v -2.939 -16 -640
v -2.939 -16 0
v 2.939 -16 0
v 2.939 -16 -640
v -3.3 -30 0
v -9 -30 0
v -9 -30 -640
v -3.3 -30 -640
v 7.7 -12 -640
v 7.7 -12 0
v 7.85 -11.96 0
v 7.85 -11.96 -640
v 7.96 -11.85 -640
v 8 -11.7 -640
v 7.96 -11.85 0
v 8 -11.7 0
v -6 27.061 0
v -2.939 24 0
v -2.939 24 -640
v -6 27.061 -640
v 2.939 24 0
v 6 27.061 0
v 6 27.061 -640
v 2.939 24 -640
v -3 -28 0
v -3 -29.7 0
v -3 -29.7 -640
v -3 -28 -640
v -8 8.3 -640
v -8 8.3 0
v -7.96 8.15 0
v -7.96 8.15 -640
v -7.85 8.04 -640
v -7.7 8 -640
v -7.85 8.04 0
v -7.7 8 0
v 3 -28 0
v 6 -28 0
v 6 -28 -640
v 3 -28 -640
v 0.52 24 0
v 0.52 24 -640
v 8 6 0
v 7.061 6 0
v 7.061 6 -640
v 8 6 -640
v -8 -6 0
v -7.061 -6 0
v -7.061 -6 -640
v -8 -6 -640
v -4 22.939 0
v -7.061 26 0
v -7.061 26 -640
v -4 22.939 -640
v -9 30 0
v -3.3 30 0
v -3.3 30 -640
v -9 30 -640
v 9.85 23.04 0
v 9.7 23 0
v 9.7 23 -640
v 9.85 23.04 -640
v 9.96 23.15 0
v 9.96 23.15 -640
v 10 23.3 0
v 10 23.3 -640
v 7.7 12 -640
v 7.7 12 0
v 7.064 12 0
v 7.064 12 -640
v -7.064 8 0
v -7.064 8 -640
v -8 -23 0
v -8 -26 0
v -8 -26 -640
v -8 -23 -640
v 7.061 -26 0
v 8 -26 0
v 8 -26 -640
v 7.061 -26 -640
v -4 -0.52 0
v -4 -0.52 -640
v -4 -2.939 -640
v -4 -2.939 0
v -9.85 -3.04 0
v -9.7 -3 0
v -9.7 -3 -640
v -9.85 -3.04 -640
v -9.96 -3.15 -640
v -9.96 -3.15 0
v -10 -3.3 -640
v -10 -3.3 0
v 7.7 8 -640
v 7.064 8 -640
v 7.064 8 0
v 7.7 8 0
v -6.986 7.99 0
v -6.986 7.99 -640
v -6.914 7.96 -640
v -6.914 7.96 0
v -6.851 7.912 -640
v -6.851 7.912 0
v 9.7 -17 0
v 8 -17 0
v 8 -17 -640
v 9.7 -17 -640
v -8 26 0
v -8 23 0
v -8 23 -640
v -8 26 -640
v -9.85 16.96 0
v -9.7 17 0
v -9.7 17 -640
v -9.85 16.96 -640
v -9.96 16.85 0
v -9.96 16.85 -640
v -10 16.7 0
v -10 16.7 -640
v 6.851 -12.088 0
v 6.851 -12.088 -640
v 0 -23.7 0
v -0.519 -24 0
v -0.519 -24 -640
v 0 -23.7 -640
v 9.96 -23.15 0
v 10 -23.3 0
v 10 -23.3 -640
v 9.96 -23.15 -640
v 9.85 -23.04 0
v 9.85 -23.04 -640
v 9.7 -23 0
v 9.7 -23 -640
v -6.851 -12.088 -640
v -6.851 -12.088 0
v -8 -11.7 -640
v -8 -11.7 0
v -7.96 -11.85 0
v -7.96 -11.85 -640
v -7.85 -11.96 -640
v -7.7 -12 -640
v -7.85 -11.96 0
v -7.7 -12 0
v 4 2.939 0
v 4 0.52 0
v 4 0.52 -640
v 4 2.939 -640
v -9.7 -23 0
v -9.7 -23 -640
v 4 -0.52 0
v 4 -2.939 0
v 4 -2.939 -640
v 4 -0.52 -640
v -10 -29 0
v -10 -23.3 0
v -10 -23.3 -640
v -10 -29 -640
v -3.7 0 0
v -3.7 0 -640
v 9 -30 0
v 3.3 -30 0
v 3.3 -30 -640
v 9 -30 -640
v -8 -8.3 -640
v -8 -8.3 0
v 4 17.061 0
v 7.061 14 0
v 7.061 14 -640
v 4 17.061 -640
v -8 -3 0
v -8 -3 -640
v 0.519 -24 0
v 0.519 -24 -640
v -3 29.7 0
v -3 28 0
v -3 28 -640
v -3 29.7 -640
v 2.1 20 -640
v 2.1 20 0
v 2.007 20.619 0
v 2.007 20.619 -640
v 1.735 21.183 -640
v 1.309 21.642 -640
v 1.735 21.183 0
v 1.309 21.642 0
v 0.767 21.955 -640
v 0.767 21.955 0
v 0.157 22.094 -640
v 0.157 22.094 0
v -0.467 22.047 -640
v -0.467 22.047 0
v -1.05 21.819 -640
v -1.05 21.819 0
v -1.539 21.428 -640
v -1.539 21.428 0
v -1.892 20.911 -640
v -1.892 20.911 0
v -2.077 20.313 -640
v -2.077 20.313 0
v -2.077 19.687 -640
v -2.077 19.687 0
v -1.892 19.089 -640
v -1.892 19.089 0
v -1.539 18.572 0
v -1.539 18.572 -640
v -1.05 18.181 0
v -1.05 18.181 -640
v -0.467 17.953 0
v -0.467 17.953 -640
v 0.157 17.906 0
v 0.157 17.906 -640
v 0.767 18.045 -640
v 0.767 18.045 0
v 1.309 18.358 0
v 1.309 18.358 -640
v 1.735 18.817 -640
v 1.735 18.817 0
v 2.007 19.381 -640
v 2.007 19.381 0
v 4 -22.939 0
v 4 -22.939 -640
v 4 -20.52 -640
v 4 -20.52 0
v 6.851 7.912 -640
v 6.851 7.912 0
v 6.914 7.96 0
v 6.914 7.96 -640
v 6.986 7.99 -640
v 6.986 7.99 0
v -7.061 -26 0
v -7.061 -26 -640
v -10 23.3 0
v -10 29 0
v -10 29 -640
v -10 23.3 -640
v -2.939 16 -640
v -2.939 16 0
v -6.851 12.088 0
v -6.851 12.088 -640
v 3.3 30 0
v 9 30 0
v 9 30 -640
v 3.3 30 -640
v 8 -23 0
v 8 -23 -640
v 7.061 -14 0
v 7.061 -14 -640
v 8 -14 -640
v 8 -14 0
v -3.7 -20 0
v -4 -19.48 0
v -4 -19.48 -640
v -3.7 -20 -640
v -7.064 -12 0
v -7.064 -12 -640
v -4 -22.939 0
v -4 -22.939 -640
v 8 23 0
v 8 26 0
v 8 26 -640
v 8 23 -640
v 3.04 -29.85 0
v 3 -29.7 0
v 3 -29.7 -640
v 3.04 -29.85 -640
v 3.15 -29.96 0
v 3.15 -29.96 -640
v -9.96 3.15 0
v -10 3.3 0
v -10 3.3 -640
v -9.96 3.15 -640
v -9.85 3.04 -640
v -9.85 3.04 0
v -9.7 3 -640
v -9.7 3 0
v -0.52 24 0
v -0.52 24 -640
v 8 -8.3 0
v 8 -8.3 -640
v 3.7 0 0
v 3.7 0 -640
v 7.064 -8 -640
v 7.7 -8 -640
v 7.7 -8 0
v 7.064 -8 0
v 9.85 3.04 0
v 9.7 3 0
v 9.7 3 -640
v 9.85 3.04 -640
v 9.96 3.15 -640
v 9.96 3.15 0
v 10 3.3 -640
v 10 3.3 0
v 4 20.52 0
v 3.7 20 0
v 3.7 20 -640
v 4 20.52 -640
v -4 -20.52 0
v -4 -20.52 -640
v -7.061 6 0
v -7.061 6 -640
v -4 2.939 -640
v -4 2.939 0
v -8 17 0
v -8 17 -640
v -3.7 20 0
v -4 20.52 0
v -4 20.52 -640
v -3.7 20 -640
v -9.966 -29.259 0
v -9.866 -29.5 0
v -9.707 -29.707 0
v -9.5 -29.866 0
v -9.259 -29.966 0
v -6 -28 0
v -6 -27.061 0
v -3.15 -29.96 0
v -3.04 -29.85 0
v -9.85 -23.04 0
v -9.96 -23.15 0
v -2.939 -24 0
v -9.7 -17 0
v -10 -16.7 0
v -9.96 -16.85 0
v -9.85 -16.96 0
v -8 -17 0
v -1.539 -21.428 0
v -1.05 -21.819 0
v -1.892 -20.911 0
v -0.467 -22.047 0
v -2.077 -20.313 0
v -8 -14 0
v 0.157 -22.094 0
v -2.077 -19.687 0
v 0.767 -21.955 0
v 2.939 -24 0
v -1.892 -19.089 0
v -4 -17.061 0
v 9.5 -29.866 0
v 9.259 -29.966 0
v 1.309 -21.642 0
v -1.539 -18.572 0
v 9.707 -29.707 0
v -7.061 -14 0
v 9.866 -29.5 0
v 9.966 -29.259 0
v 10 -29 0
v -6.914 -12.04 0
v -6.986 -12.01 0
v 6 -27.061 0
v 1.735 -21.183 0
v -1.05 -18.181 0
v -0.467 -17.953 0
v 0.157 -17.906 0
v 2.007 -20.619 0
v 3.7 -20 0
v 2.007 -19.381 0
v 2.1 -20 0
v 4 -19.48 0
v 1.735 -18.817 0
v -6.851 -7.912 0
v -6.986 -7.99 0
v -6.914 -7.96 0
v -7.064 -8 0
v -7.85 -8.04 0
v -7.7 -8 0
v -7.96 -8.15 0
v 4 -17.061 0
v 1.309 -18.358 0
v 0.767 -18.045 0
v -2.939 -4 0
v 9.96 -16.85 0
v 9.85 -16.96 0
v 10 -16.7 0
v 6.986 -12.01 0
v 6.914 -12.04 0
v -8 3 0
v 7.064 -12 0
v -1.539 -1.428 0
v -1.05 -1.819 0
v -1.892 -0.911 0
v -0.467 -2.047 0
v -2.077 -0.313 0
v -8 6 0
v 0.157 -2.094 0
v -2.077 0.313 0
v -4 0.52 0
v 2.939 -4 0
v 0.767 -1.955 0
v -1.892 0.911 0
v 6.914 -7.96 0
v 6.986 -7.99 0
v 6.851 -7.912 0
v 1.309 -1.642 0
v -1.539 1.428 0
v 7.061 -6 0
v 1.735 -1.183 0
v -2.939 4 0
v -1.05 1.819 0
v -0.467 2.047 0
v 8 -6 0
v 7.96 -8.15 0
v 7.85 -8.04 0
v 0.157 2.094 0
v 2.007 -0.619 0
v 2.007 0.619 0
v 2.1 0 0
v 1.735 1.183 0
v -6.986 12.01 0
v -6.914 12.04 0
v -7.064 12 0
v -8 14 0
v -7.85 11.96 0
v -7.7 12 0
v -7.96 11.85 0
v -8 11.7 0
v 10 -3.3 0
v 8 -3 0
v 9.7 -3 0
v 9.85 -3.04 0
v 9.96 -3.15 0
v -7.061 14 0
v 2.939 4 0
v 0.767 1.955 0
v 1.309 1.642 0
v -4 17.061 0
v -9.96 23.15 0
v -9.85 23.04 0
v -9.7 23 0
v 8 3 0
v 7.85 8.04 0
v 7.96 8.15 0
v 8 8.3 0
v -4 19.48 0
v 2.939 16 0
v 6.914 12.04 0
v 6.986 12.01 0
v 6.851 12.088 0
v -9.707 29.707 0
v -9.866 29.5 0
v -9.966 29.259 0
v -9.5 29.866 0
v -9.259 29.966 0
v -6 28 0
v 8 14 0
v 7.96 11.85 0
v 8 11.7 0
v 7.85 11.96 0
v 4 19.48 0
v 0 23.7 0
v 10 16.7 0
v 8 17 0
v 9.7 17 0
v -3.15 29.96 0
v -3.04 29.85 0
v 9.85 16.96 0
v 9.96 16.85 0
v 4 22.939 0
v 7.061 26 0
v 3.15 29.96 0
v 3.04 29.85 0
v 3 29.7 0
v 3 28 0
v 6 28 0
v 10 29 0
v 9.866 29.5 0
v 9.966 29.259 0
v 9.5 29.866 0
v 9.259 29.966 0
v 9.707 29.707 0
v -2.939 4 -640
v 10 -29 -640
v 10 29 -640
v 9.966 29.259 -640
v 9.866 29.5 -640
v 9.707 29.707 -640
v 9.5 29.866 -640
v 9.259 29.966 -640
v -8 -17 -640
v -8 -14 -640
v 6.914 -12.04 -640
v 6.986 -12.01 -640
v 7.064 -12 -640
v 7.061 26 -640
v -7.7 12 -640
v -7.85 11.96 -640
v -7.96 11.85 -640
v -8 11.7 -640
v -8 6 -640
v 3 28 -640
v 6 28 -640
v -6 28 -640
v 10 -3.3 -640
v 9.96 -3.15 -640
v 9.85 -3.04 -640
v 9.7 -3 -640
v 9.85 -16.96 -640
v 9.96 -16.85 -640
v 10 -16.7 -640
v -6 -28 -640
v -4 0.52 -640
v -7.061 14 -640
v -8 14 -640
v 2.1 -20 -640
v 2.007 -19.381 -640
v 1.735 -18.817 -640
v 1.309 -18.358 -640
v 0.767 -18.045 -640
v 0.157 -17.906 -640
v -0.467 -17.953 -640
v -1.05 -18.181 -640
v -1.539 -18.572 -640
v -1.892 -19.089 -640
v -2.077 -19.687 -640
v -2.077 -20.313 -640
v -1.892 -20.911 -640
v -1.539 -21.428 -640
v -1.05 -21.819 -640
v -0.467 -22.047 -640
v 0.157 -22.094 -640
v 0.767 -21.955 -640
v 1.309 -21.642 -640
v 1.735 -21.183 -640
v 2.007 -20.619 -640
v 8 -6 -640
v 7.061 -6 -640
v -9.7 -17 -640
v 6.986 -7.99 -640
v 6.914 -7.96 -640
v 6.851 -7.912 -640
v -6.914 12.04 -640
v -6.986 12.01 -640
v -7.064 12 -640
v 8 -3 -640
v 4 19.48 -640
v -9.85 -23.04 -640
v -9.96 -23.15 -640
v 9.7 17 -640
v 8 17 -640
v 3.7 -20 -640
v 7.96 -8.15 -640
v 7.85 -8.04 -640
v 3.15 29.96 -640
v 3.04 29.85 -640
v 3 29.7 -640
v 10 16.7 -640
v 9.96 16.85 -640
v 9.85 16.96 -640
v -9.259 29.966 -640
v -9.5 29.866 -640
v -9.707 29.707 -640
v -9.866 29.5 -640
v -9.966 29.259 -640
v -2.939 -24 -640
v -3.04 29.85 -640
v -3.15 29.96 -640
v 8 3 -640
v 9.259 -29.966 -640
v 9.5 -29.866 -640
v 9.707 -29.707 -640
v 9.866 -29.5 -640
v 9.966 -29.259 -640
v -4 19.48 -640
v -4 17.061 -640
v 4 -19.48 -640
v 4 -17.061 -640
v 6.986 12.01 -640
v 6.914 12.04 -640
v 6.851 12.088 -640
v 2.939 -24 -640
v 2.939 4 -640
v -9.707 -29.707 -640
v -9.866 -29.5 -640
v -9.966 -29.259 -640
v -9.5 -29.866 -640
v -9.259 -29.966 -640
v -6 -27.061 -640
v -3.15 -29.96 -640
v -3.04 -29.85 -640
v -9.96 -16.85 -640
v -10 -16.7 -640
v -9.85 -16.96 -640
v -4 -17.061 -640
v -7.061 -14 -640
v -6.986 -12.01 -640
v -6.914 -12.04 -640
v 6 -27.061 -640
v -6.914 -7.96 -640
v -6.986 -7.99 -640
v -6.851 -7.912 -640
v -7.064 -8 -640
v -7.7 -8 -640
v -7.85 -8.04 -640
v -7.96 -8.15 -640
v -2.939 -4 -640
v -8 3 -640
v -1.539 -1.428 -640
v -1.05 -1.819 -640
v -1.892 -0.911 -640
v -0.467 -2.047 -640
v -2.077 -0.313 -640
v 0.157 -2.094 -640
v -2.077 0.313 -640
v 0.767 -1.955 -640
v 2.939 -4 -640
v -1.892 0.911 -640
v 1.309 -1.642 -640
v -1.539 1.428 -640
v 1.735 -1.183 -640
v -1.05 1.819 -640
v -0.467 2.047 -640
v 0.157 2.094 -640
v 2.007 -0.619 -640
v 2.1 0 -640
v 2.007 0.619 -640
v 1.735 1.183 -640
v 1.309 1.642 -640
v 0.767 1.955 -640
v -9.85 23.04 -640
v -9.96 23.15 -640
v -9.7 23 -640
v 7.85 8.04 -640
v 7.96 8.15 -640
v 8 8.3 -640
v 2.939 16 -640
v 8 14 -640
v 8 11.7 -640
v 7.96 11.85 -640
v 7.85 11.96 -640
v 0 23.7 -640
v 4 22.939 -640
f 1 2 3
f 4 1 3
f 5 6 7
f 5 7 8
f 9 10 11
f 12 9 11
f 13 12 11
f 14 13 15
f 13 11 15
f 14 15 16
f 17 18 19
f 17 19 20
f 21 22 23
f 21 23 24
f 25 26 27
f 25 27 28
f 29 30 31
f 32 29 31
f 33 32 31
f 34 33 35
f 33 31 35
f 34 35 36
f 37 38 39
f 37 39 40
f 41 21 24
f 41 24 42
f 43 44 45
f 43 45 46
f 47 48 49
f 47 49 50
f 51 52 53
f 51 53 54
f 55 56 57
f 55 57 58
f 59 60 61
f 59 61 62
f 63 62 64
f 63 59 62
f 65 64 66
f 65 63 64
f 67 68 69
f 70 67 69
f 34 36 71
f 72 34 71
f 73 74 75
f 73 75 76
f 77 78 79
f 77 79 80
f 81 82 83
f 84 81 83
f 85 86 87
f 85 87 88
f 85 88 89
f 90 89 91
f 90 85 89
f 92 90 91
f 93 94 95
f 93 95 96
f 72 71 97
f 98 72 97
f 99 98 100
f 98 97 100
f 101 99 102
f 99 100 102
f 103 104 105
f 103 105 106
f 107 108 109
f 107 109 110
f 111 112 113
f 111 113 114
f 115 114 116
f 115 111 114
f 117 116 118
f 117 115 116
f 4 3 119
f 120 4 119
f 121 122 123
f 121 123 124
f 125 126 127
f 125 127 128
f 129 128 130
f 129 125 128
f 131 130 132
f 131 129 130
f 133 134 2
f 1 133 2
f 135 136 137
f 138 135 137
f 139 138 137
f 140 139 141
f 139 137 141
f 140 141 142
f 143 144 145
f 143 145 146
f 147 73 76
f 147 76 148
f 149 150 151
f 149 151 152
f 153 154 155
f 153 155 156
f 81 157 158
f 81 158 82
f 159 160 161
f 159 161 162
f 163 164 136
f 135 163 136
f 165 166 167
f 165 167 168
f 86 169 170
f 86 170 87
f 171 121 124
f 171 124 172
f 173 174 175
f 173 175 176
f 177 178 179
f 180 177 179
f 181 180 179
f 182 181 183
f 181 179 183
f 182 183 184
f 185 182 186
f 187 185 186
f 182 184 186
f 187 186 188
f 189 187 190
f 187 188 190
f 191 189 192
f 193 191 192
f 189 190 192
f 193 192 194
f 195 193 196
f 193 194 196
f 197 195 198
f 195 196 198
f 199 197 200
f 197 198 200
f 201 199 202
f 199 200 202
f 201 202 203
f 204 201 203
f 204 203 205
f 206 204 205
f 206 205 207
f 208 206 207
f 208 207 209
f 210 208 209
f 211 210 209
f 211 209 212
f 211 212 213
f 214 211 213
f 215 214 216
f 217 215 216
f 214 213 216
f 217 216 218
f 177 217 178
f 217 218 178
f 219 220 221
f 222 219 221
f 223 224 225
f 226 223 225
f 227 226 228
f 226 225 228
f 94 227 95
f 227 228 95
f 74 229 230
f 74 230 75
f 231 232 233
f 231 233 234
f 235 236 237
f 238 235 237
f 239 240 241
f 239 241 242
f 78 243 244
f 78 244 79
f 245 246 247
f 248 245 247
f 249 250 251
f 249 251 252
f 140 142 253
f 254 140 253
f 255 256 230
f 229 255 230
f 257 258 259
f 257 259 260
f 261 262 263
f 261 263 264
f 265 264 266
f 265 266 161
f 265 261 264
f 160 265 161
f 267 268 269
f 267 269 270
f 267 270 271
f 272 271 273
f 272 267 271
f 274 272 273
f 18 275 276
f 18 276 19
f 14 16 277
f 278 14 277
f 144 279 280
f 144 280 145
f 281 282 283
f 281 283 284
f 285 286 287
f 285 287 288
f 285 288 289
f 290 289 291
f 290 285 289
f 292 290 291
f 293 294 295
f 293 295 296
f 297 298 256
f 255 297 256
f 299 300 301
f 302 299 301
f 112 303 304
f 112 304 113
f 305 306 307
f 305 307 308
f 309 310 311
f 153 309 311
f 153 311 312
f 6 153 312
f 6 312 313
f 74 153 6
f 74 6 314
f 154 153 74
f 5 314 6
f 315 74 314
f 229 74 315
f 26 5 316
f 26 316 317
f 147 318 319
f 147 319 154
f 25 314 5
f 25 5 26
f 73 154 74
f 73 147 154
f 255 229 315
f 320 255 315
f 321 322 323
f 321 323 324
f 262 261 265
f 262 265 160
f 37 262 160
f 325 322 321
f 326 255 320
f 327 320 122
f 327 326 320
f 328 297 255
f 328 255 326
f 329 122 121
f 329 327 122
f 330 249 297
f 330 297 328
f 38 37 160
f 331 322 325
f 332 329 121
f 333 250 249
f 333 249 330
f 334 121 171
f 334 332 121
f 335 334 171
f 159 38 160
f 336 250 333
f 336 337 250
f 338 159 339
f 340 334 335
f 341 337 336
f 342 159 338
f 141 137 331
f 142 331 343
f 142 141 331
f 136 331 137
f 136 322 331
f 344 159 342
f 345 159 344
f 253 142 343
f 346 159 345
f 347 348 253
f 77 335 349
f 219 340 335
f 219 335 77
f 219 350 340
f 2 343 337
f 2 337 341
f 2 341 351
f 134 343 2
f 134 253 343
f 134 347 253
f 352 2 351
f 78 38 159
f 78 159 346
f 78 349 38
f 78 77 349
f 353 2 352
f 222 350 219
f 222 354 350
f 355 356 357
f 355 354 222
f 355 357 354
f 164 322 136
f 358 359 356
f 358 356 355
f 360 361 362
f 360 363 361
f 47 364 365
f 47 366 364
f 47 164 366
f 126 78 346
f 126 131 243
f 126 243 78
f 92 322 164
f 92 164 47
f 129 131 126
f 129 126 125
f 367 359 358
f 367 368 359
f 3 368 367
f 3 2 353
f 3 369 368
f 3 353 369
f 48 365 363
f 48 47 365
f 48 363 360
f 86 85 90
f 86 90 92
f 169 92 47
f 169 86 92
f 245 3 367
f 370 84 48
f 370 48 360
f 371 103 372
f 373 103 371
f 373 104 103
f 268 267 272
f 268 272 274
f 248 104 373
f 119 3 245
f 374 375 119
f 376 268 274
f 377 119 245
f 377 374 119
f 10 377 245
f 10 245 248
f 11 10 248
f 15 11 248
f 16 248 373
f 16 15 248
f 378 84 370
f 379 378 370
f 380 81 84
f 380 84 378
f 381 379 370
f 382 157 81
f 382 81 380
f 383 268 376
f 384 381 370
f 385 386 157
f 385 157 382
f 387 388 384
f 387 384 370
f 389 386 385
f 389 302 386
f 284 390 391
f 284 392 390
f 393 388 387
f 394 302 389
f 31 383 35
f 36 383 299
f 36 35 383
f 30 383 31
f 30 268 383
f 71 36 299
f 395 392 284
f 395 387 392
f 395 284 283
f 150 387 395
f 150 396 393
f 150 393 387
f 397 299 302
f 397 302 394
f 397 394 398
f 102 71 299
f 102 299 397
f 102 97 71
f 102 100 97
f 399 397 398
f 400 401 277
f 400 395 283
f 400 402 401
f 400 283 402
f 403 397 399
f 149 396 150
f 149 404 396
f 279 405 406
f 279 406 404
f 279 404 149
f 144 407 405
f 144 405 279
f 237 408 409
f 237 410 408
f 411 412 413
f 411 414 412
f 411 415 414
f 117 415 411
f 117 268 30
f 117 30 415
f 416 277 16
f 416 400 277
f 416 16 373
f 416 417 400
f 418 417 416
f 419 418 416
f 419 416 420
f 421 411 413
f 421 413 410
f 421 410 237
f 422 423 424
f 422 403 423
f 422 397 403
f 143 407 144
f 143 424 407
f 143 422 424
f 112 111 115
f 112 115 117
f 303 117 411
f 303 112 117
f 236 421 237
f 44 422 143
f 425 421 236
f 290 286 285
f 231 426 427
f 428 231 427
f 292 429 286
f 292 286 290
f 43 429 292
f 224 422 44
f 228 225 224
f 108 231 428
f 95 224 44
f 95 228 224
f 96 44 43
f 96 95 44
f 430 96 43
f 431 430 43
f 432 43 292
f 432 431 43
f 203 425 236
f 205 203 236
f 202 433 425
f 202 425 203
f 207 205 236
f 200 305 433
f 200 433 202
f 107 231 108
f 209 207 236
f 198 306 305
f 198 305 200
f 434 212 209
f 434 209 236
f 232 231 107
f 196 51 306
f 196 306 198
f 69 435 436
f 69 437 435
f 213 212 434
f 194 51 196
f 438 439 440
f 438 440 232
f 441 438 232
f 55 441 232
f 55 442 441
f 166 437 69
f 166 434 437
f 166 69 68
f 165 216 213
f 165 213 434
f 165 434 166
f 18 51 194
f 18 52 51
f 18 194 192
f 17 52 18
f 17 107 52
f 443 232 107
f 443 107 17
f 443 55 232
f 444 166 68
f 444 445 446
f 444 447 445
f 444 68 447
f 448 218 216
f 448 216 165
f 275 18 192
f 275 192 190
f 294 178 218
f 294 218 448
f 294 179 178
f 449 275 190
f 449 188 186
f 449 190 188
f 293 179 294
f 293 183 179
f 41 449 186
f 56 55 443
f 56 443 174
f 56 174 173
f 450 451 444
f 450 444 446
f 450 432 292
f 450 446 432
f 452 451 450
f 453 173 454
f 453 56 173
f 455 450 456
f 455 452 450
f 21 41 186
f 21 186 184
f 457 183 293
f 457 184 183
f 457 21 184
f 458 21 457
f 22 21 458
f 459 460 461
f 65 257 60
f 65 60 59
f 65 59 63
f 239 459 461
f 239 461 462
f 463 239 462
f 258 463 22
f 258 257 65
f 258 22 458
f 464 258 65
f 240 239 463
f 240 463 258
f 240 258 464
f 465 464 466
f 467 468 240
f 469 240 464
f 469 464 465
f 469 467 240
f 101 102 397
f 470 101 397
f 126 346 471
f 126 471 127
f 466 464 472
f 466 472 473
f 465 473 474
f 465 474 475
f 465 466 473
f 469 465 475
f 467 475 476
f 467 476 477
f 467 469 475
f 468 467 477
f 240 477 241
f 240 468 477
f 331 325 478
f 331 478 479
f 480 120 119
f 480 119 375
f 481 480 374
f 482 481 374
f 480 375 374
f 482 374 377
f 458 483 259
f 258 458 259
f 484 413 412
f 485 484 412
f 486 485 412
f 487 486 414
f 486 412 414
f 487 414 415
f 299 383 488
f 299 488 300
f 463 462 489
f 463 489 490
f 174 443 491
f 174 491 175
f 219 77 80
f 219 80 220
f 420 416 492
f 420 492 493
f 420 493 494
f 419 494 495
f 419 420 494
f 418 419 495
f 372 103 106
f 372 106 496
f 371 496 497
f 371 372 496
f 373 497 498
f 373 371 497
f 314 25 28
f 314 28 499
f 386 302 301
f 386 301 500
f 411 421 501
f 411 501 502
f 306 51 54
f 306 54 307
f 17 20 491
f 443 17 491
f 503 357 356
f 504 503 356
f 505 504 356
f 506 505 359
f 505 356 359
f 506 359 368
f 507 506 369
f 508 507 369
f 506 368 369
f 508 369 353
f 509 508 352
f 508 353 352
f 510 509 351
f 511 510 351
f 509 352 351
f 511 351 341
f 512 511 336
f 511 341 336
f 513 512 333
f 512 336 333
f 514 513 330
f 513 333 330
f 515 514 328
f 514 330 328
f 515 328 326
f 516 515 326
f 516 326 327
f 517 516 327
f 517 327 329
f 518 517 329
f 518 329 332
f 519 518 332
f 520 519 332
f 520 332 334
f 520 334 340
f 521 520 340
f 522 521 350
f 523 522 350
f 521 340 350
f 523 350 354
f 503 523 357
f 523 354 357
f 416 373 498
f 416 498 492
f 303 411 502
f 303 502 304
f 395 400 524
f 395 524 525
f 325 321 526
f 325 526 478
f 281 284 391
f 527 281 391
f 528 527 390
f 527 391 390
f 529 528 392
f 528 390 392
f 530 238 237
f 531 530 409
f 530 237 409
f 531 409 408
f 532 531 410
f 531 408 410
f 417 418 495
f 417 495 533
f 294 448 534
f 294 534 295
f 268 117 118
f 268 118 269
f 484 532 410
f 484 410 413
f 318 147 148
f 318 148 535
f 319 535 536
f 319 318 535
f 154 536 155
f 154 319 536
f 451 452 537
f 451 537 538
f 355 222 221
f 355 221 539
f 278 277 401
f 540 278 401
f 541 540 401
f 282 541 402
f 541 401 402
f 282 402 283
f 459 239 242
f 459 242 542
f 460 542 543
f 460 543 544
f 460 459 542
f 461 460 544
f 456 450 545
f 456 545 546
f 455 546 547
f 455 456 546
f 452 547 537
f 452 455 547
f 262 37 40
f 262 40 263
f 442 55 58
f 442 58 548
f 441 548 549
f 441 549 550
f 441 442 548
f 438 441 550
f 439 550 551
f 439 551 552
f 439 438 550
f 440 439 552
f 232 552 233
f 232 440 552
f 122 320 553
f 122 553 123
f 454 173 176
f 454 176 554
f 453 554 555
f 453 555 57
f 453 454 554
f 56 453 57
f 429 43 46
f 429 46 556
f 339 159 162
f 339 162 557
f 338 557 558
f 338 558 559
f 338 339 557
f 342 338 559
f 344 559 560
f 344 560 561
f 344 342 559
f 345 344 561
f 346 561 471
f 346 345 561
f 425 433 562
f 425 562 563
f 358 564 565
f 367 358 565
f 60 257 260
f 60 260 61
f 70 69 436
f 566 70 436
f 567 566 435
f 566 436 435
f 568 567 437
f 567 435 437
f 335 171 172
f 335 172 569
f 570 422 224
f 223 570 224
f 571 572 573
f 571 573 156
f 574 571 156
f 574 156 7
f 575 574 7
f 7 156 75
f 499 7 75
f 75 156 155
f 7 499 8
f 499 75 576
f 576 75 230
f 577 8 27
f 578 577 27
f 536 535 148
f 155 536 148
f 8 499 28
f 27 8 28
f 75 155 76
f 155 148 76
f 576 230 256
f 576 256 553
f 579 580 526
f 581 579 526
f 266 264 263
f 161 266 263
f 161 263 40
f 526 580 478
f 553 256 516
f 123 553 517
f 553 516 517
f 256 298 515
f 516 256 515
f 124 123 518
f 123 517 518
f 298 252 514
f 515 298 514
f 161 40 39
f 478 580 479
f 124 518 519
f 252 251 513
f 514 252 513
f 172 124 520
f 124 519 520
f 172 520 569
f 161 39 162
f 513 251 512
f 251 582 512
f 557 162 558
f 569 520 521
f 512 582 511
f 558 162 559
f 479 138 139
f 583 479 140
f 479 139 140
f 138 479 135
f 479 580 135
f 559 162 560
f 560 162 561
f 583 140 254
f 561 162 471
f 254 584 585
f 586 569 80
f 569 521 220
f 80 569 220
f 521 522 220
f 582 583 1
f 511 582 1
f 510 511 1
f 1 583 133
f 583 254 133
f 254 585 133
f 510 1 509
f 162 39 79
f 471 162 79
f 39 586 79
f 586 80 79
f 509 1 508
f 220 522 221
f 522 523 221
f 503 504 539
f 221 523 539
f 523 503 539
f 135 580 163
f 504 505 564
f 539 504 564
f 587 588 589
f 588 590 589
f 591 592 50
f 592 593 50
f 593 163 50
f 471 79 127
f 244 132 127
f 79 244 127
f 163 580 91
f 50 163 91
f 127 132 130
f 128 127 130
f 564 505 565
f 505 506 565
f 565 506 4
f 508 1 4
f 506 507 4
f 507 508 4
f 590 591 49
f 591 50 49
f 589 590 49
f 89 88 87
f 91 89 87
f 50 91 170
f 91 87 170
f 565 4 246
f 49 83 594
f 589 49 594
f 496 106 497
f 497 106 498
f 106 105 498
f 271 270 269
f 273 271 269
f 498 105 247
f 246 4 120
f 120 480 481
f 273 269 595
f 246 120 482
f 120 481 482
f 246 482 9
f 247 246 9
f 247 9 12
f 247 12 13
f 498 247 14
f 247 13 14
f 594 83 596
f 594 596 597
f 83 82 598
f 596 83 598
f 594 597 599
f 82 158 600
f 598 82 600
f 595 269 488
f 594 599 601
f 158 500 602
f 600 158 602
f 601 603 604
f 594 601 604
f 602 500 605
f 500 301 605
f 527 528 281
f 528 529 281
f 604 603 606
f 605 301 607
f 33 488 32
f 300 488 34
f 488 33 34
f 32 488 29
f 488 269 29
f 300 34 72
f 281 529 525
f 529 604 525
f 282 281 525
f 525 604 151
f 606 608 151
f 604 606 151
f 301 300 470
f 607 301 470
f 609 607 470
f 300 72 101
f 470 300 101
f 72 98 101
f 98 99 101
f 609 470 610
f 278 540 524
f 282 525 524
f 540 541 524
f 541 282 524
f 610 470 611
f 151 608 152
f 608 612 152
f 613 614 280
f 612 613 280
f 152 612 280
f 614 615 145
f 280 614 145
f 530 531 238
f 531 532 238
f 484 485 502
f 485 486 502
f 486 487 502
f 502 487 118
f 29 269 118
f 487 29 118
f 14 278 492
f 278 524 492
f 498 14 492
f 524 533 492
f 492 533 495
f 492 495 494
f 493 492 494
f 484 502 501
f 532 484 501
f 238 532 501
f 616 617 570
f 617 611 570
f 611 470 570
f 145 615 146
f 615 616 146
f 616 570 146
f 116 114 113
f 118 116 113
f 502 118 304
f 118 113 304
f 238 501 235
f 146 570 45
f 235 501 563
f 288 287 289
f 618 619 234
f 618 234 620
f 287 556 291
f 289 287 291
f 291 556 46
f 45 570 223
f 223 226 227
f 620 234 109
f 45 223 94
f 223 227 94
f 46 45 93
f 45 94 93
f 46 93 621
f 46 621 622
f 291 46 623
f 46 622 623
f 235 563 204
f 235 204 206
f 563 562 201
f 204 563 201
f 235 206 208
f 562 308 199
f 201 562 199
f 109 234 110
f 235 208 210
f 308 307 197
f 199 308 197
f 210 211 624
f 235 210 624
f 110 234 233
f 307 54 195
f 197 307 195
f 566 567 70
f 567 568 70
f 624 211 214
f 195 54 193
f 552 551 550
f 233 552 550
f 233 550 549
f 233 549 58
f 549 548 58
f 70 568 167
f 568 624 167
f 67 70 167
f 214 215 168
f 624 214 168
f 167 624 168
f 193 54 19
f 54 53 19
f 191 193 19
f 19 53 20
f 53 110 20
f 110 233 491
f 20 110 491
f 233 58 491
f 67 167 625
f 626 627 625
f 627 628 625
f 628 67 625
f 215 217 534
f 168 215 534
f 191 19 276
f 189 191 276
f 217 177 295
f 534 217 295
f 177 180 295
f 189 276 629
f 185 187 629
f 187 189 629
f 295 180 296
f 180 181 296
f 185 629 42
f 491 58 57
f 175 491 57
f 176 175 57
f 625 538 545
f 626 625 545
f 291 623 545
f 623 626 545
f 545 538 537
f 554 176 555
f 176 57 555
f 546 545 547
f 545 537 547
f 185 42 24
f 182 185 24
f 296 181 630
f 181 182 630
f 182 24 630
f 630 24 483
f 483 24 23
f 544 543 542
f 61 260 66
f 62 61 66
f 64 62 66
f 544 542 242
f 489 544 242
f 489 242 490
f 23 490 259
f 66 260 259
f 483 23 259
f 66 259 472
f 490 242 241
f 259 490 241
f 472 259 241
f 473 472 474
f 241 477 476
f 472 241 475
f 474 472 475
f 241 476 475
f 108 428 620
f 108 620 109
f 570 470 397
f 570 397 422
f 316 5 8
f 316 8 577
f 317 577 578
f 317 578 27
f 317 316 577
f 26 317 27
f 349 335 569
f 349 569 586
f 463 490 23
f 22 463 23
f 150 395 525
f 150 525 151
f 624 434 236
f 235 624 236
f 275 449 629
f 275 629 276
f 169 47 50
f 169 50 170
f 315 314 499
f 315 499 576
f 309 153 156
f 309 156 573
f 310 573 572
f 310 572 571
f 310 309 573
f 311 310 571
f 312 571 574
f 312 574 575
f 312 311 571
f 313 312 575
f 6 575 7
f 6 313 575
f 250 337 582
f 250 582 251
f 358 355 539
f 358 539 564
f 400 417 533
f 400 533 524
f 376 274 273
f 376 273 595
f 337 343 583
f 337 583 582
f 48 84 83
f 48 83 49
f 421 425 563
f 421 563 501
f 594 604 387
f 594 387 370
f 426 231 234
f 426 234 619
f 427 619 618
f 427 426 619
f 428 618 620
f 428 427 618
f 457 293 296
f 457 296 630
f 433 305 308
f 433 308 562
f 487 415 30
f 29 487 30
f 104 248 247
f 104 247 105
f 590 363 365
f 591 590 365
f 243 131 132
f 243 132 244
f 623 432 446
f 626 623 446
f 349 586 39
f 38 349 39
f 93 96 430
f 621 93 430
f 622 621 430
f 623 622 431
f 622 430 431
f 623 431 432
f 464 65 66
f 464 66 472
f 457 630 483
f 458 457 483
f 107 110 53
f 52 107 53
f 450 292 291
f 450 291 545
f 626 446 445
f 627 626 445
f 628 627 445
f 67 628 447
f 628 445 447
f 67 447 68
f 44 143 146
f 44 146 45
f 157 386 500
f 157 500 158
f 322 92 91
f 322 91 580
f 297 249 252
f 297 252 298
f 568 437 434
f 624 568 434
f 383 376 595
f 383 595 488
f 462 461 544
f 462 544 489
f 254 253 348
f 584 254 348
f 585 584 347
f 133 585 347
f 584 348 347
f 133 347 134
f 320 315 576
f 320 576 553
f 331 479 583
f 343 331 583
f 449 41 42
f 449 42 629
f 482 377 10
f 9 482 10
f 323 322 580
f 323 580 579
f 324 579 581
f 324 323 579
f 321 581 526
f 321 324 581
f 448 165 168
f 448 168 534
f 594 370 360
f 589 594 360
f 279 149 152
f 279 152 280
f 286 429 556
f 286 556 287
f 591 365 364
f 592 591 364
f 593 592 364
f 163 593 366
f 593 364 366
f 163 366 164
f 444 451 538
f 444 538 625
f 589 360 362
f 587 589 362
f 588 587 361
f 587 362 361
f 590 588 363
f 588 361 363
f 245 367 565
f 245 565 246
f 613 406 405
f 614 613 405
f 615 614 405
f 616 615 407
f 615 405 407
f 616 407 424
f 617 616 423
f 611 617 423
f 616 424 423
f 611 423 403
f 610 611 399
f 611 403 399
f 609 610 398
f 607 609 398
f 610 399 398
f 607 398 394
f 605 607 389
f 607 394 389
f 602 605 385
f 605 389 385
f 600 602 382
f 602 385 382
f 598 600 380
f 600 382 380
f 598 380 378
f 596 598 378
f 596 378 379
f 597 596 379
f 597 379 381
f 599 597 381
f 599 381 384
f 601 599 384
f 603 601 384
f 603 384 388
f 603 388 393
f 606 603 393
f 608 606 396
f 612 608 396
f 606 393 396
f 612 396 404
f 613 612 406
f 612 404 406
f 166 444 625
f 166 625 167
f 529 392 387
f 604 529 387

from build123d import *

# Parameters (mm, degrees)
SKETCH_1_R      = 2.0999999
EXTRUDE_1_DEPTH = 640


with BuildPart() as part:
    # 草圖1 → 填料-伸長1 (new body)
    with BuildSketch(Plane.XY):
        with BuildLine():
            Line((-10, 16.7), (-10, 3.3))
            ThreePointArc((-10, 3.3), (-9.912132034, 3.087867966), (-9.7, 3))
            Line((-9.7, 3), (-8, 3))
            Line((-8, 3), (-8, 6))
            Line((-8, 6), (-7.060650687, 6))
            Line((-7.060650687, 6), (-4, 2.939349))
            Line((-4, 2.939349), (-4, 0.519615242))
            Line((-4, 0.519615242), (-3.7, 0))
            Line((-3.7, 0), (-4, -0.519615242))
            Line((-4, -0.519615242), (-4, -2.9393502))
            Line((-4, -2.9393502), (-7.060649487, -6))
            Line((-7.060649487, -6), (-8, -6))
            Line((-8, -6), (-8, -3))
            Line((-8, -3), (-9.7, -3))
            ThreePointArc((-9.7, -3), (-9.912132034, -3.087867966), (-10, -3.3))
            Line((-10, -3.3), (-10, -16.7))
            ThreePointArc((-10, -16.7), (-9.912132034, -16.912132034), (-9.7, -17))
            Line((-9.7, -17), (-8, -17))
            Line((-8, -17), (-8, -14))
            Line((-8, -14), (-7.060672887, -14))
            Line((-7.060672887, -14), (-4, -17.0606732))
            Line((-4, -17.0606732), (-4, -19.480384758))
            Line((-4, -19.480384758), (-3.7, -20))
            Line((-3.7, -20), (-4, -20.519615242))
            Line((-4, -20.519615242), (-4, -22.93935665))
            Line((-4, -22.93935665), (-7.060643037, -26))
            Line((-7.060643037, -26), (-8, -26))
            Line((-8, -26), (-8, -23))
            Line((-8, -23), (-9.7, -23))
            ThreePointArc((-9.7, -23), (-9.912132034, -23.087867966), (-10, -23.3))
            Line((-10, -23.3), (-10, -29))
            ThreePointArc((-10, -29), (-9.707106781, -29.707106781), (-9, -30))
            Line((-9, -30), (-3.3, -30))
            ThreePointArc((-3.3, -30), (-3.087867966, -29.912132034), (-3, -29.7))
            Line((-3, -29.7), (-3, -28))
            Line((-3, -28), (-6, -28))
            Line((-6, -28), (-6, -27.060683408))
            Line((-6, -27.060683408), (-2.939316, -24))
            Line((-2.939316, -24), (-0.519095055, -24))
            Line((-0.519095055, -24), (1e-06, -23.7))
            Line((1e-06, -23.7), (0.518577868, -24))
            Line((0.518577868, -24), (2.939318, -24))
            Line((2.939318, -24), (6, -27.060682403))
            Line((6, -27.060682403), (6, -28))
            Line((6, -28), (3, -28))
            Line((3, -28), (3, -29.7))
            ThreePointArc((3, -29.7), (3.087867966, -29.912132034), (3.3, -30))
            Line((3.3, -30), (9, -30))
            ThreePointArc((9, -30), (9.707106781, -29.707106781), (10, -29))
            Line((10, -29), (10, -23.3))
            ThreePointArc((10, -23.3), (9.912132034, -23.087867966), (9.7, -23))
            Line((9.7, -23), (8, -23))
            Line((8, -23), (8, -26))
            Line((8, -26), (7.060637687, -26))
            Line((7.060637687, -26), (4, -22.93935641))
            Line((4, -22.93935641), (4, -20.519623992))
            Line((4, -20.519623992), (3.7, -20.00000875))
            Line((3.7, -20.00000875), (4, -19.480393508))
            Line((4, -19.480393508), (4, -17.06066109))
            Line((4, -17.06066109), (7.060655187, -14))
            Line((7.060655187, -14), (8, -14))
            Line((8, -14), (8, -17))
            Line((8, -17), (9.7, -17))
            ThreePointArc((9.7, -17), (9.912132034, -16.912132034), (10, -16.7))
            Line((10, -16.7), (10, -3.3))
            ThreePointArc((10, -3.3), (9.912132034, -3.087867966), (9.7, -3))
            Line((9.7, -3), (8, -3))
            Line((8, -3), (8, -6))
            Line((8, -6), (7.060651537, -6))
            Line((7.060651537, -6), (4, -2.93934815))
            Line((4, -2.93934815), (4, -0.519623992))
            Line((4, -0.519623992), (3.7, -8.75e-06))
            Line((3.7, -8.75e-06), (4, 0.519606492))
            Line((4, 0.519606492), (4, 2.9393426))
            Line((4, 2.9393426), (7.060657087, 6))
            Line((7.060657087, 6), (8, 6))
            Line((8, 6), (8, 3))
            Line((8, 3), (9.7, 3))
            ThreePointArc((9.7, 3), (9.912132034, 3.087867966), (10, 3.3))
            Line((10, 3.3), (10, 16.7))
            ThreePointArc((10, 16.7), (9.912132034, 16.912132034), (9.7, 17))
            Line((9.7, 17), (8, 17))
            Line((8, 17), (8, 14))
            Line((8, 14), (7.06065821, 14))
            Line((7.06065821, 14), (4, 17.060658523))
            Line((4, 17.060658523), (4, 19.480376008))
            Line((4, 19.480376008), (3.7, 19.99999125))
            Line((3.7, 19.99999125), (4, 20.519606492))
            Line((4, 20.519606492), (4, 22.939362173))
            Line((4, 22.939362173), (7.060637514, 26))
            Line((7.060637514, 26), (8, 26))
            Line((8, 26), (8, 23))
            Line((8, 23), (9.7, 23))
            ThreePointArc((9.7, 23), (9.912132034, 23.087867966), (10, 23.3))
            Line((10, 23.3), (10, 29))
            ThreePointArc((10, 29), (9.707106781, 29.707106781), (9, 30))
            Line((9, 30), (3.3, 30))
            ThreePointArc((3.3, 30), (3.087867966, 29.912132034), (3, 29.7))
            Line((3, 29.7), (3, 28))
            Line((3, 28), (6, 28))
            Line((6, 28), (6, 27.060684313))
            Line((6, 27.060684313), (2.939316, 24))
            Line((2.939316, 24), (0.519614242, 24))
            Line((0.519614242, 24), (-1e-06, 23.7))
            Line((-1e-06, 23.7), (-0.519616242, 24))
            Line((-0.519616242, 24), (-2.939318, 24))
            Line((-2.939318, 24), (-6, 27.060682313))
            Line((-6, 27.060682313), (-6, 28))
            Line((-6, 28), (-3, 28))
            Line((-3, 28), (-3, 29.7))
            ThreePointArc((-3, 29.7), (-3.087867966, 29.912132034), (-3.3, 30))
            Line((-3.3, 30), (-9, 30))
            ThreePointArc((-9, 30), (-9.707106781, 29.707106781), (-10, 29))
            Line((-10, 29), (-10, 23.3))
            ThreePointArc((-10, 23.3), (-9.912132034, 23.087867966), (-9.7, 23))
            Line((-9.7, 23), (-8, 23))
            Line((-8, 23), (-8, 26))
            Line((-8, 26), (-7.060644014, 26))
            Line((-7.060644014, 26), (-4, 22.939355673))
            Line((-4, 22.939355673), (-4, 20.519615242))
            Line((-4, 20.519615242), (-3.7, 20))
            Line((-3.7, 20), (-4, 19.480384758))
            Line((-4, 19.480384758), (-4, 17.060669373))
            Line((-4, 17.060669373), (-7.06066906, 14))
            Line((-7.06066906, 14), (-8, 14))
            Line((-8, 14), (-8, 17))
            Line((-8, 17), (-9.7, 17))
            ThreePointArc((-9.7, 17), (-9.912132034, 16.912132034), (-10, 16.7))
        make_face()
        with Locations((0, 20.000013123)):
            Circle(SKETCH_1_R, mode=Mode.SUBTRACT)
        Circle(SKETCH_1_R, mode=Mode.SUBTRACT)
        with Locations((0, -20.000013525)):
            Circle(SKETCH_1_R, mode=Mode.SUBTRACT)
        with BuildLine():
            Line((-7.7, 8), (-7.063594325, 8))
            ThreePointArc((-7.063594325, 8), (-6.948789288, 7.977163857), (-6.85146228, 7.912132024))
            Line((-6.85146228, 7.912132024), (-2.939330656, 4))
            Line((-2.939330656, 4), (2.939337056, 4))
            Line((2.939337056, 4), (6.85146868, 7.912132024))
            ThreePointArc((6.85146868, 7.912132024), (6.948795688, 7.977163857), (7.063600725, 8))
            Line((7.063600725, 8), (7.7, 8))
            ThreePointArc((7.7, 8), (7.912132034, 8.087867966), (8, 8.3))
            Line((8, 8.3), (8, 11.7))
            ThreePointArc((8, 11.7), (7.912132034, 11.912132034), (7.7, 12))
            Line((7.7, 12), (7.063601848, 12))
            ThreePointArc((7.063601848, 12), (6.948796811, 12.022836143), (6.851469803, 12.087867976))
            Line((6.851469803, 12.087867976), (2.939338179, 16))
            Line((2.939338179, 16), (-2.939349029, 16))
            Line((-2.939349029, 16), (-6.851480653, 12.087867976))
            ThreePointArc((-6.851480653, 12.087867976), (-6.948807661, 12.022836143), (-7.063612698, 12))
            Line((-7.063612698, 12), (-7.7, 12))
            ThreePointArc((-7.7, 12), (-7.912132034, 11.912132034), (-8, 11.7))
            Line((-8, 11.7), (-8, 8.3))
            ThreePointArc((-8, 8.3), (-7.912132034, 8.087867966), (-7.7, 8))
        make_face(mode=Mode.SUBTRACT)
        with BuildLine():
            Line((-8, -8.3), (-8, -11.7))
            ThreePointArc((-8, -11.7), (-7.912132034, -11.912132034), (-7.7, -12))
            Line((-7.7, -12), (-7.063616525, -12))
            ThreePointArc((-7.063616525, -12), (-6.948811488, -12.022836143), (-6.85148448, -12.087867976))
            Line((-6.85148448, -12.087867976), (-2.939352856, -16))
            Line((-2.939352856, -16), (2.939340746, -16))
            Line((2.939340746, -16), (6.851465031, -12.08786817))
            ThreePointArc((6.851465031, -12.08786817), (6.948792107, -12.022836196), (7.06359727, -12))
            Line((7.06359727, -12), (7.7, -12))
            ThreePointArc((7.7, -12), (7.912132034, -11.912132034), (8, -11.7))
            Line((8, -11.7), (8, -8.3))
            ThreePointArc((8, -8.3), (7.912132034, -8.087867966), (7.7, -8))
            Line((7.7, -8), (7.063595175, -8))
            ThreePointArc((7.063595175, -8), (6.948790138, -7.977163857), (6.85146313, -7.912132024))
            Line((6.85146313, -7.912132024), (2.939331506, -4))
            Line((2.939331506, -4), (-2.939329456, -4))
            Line((-2.939329456, -4), (-6.85146108, -7.912132024))
            ThreePointArc((-6.85146108, -7.912132024), (-6.948788088, -7.977163857), (-7.063593125, -8))
            Line((-7.063593125, -8), (-7.7, -8))
            ThreePointArc((-7.7, -8), (-7.912132034, -8.087867966), (-8, -8.3))
        make_face(mode=Mode.SUBTRACT)
    extrude(amount=-EXTRUDE_1_DEPTH)


solid = part.part
